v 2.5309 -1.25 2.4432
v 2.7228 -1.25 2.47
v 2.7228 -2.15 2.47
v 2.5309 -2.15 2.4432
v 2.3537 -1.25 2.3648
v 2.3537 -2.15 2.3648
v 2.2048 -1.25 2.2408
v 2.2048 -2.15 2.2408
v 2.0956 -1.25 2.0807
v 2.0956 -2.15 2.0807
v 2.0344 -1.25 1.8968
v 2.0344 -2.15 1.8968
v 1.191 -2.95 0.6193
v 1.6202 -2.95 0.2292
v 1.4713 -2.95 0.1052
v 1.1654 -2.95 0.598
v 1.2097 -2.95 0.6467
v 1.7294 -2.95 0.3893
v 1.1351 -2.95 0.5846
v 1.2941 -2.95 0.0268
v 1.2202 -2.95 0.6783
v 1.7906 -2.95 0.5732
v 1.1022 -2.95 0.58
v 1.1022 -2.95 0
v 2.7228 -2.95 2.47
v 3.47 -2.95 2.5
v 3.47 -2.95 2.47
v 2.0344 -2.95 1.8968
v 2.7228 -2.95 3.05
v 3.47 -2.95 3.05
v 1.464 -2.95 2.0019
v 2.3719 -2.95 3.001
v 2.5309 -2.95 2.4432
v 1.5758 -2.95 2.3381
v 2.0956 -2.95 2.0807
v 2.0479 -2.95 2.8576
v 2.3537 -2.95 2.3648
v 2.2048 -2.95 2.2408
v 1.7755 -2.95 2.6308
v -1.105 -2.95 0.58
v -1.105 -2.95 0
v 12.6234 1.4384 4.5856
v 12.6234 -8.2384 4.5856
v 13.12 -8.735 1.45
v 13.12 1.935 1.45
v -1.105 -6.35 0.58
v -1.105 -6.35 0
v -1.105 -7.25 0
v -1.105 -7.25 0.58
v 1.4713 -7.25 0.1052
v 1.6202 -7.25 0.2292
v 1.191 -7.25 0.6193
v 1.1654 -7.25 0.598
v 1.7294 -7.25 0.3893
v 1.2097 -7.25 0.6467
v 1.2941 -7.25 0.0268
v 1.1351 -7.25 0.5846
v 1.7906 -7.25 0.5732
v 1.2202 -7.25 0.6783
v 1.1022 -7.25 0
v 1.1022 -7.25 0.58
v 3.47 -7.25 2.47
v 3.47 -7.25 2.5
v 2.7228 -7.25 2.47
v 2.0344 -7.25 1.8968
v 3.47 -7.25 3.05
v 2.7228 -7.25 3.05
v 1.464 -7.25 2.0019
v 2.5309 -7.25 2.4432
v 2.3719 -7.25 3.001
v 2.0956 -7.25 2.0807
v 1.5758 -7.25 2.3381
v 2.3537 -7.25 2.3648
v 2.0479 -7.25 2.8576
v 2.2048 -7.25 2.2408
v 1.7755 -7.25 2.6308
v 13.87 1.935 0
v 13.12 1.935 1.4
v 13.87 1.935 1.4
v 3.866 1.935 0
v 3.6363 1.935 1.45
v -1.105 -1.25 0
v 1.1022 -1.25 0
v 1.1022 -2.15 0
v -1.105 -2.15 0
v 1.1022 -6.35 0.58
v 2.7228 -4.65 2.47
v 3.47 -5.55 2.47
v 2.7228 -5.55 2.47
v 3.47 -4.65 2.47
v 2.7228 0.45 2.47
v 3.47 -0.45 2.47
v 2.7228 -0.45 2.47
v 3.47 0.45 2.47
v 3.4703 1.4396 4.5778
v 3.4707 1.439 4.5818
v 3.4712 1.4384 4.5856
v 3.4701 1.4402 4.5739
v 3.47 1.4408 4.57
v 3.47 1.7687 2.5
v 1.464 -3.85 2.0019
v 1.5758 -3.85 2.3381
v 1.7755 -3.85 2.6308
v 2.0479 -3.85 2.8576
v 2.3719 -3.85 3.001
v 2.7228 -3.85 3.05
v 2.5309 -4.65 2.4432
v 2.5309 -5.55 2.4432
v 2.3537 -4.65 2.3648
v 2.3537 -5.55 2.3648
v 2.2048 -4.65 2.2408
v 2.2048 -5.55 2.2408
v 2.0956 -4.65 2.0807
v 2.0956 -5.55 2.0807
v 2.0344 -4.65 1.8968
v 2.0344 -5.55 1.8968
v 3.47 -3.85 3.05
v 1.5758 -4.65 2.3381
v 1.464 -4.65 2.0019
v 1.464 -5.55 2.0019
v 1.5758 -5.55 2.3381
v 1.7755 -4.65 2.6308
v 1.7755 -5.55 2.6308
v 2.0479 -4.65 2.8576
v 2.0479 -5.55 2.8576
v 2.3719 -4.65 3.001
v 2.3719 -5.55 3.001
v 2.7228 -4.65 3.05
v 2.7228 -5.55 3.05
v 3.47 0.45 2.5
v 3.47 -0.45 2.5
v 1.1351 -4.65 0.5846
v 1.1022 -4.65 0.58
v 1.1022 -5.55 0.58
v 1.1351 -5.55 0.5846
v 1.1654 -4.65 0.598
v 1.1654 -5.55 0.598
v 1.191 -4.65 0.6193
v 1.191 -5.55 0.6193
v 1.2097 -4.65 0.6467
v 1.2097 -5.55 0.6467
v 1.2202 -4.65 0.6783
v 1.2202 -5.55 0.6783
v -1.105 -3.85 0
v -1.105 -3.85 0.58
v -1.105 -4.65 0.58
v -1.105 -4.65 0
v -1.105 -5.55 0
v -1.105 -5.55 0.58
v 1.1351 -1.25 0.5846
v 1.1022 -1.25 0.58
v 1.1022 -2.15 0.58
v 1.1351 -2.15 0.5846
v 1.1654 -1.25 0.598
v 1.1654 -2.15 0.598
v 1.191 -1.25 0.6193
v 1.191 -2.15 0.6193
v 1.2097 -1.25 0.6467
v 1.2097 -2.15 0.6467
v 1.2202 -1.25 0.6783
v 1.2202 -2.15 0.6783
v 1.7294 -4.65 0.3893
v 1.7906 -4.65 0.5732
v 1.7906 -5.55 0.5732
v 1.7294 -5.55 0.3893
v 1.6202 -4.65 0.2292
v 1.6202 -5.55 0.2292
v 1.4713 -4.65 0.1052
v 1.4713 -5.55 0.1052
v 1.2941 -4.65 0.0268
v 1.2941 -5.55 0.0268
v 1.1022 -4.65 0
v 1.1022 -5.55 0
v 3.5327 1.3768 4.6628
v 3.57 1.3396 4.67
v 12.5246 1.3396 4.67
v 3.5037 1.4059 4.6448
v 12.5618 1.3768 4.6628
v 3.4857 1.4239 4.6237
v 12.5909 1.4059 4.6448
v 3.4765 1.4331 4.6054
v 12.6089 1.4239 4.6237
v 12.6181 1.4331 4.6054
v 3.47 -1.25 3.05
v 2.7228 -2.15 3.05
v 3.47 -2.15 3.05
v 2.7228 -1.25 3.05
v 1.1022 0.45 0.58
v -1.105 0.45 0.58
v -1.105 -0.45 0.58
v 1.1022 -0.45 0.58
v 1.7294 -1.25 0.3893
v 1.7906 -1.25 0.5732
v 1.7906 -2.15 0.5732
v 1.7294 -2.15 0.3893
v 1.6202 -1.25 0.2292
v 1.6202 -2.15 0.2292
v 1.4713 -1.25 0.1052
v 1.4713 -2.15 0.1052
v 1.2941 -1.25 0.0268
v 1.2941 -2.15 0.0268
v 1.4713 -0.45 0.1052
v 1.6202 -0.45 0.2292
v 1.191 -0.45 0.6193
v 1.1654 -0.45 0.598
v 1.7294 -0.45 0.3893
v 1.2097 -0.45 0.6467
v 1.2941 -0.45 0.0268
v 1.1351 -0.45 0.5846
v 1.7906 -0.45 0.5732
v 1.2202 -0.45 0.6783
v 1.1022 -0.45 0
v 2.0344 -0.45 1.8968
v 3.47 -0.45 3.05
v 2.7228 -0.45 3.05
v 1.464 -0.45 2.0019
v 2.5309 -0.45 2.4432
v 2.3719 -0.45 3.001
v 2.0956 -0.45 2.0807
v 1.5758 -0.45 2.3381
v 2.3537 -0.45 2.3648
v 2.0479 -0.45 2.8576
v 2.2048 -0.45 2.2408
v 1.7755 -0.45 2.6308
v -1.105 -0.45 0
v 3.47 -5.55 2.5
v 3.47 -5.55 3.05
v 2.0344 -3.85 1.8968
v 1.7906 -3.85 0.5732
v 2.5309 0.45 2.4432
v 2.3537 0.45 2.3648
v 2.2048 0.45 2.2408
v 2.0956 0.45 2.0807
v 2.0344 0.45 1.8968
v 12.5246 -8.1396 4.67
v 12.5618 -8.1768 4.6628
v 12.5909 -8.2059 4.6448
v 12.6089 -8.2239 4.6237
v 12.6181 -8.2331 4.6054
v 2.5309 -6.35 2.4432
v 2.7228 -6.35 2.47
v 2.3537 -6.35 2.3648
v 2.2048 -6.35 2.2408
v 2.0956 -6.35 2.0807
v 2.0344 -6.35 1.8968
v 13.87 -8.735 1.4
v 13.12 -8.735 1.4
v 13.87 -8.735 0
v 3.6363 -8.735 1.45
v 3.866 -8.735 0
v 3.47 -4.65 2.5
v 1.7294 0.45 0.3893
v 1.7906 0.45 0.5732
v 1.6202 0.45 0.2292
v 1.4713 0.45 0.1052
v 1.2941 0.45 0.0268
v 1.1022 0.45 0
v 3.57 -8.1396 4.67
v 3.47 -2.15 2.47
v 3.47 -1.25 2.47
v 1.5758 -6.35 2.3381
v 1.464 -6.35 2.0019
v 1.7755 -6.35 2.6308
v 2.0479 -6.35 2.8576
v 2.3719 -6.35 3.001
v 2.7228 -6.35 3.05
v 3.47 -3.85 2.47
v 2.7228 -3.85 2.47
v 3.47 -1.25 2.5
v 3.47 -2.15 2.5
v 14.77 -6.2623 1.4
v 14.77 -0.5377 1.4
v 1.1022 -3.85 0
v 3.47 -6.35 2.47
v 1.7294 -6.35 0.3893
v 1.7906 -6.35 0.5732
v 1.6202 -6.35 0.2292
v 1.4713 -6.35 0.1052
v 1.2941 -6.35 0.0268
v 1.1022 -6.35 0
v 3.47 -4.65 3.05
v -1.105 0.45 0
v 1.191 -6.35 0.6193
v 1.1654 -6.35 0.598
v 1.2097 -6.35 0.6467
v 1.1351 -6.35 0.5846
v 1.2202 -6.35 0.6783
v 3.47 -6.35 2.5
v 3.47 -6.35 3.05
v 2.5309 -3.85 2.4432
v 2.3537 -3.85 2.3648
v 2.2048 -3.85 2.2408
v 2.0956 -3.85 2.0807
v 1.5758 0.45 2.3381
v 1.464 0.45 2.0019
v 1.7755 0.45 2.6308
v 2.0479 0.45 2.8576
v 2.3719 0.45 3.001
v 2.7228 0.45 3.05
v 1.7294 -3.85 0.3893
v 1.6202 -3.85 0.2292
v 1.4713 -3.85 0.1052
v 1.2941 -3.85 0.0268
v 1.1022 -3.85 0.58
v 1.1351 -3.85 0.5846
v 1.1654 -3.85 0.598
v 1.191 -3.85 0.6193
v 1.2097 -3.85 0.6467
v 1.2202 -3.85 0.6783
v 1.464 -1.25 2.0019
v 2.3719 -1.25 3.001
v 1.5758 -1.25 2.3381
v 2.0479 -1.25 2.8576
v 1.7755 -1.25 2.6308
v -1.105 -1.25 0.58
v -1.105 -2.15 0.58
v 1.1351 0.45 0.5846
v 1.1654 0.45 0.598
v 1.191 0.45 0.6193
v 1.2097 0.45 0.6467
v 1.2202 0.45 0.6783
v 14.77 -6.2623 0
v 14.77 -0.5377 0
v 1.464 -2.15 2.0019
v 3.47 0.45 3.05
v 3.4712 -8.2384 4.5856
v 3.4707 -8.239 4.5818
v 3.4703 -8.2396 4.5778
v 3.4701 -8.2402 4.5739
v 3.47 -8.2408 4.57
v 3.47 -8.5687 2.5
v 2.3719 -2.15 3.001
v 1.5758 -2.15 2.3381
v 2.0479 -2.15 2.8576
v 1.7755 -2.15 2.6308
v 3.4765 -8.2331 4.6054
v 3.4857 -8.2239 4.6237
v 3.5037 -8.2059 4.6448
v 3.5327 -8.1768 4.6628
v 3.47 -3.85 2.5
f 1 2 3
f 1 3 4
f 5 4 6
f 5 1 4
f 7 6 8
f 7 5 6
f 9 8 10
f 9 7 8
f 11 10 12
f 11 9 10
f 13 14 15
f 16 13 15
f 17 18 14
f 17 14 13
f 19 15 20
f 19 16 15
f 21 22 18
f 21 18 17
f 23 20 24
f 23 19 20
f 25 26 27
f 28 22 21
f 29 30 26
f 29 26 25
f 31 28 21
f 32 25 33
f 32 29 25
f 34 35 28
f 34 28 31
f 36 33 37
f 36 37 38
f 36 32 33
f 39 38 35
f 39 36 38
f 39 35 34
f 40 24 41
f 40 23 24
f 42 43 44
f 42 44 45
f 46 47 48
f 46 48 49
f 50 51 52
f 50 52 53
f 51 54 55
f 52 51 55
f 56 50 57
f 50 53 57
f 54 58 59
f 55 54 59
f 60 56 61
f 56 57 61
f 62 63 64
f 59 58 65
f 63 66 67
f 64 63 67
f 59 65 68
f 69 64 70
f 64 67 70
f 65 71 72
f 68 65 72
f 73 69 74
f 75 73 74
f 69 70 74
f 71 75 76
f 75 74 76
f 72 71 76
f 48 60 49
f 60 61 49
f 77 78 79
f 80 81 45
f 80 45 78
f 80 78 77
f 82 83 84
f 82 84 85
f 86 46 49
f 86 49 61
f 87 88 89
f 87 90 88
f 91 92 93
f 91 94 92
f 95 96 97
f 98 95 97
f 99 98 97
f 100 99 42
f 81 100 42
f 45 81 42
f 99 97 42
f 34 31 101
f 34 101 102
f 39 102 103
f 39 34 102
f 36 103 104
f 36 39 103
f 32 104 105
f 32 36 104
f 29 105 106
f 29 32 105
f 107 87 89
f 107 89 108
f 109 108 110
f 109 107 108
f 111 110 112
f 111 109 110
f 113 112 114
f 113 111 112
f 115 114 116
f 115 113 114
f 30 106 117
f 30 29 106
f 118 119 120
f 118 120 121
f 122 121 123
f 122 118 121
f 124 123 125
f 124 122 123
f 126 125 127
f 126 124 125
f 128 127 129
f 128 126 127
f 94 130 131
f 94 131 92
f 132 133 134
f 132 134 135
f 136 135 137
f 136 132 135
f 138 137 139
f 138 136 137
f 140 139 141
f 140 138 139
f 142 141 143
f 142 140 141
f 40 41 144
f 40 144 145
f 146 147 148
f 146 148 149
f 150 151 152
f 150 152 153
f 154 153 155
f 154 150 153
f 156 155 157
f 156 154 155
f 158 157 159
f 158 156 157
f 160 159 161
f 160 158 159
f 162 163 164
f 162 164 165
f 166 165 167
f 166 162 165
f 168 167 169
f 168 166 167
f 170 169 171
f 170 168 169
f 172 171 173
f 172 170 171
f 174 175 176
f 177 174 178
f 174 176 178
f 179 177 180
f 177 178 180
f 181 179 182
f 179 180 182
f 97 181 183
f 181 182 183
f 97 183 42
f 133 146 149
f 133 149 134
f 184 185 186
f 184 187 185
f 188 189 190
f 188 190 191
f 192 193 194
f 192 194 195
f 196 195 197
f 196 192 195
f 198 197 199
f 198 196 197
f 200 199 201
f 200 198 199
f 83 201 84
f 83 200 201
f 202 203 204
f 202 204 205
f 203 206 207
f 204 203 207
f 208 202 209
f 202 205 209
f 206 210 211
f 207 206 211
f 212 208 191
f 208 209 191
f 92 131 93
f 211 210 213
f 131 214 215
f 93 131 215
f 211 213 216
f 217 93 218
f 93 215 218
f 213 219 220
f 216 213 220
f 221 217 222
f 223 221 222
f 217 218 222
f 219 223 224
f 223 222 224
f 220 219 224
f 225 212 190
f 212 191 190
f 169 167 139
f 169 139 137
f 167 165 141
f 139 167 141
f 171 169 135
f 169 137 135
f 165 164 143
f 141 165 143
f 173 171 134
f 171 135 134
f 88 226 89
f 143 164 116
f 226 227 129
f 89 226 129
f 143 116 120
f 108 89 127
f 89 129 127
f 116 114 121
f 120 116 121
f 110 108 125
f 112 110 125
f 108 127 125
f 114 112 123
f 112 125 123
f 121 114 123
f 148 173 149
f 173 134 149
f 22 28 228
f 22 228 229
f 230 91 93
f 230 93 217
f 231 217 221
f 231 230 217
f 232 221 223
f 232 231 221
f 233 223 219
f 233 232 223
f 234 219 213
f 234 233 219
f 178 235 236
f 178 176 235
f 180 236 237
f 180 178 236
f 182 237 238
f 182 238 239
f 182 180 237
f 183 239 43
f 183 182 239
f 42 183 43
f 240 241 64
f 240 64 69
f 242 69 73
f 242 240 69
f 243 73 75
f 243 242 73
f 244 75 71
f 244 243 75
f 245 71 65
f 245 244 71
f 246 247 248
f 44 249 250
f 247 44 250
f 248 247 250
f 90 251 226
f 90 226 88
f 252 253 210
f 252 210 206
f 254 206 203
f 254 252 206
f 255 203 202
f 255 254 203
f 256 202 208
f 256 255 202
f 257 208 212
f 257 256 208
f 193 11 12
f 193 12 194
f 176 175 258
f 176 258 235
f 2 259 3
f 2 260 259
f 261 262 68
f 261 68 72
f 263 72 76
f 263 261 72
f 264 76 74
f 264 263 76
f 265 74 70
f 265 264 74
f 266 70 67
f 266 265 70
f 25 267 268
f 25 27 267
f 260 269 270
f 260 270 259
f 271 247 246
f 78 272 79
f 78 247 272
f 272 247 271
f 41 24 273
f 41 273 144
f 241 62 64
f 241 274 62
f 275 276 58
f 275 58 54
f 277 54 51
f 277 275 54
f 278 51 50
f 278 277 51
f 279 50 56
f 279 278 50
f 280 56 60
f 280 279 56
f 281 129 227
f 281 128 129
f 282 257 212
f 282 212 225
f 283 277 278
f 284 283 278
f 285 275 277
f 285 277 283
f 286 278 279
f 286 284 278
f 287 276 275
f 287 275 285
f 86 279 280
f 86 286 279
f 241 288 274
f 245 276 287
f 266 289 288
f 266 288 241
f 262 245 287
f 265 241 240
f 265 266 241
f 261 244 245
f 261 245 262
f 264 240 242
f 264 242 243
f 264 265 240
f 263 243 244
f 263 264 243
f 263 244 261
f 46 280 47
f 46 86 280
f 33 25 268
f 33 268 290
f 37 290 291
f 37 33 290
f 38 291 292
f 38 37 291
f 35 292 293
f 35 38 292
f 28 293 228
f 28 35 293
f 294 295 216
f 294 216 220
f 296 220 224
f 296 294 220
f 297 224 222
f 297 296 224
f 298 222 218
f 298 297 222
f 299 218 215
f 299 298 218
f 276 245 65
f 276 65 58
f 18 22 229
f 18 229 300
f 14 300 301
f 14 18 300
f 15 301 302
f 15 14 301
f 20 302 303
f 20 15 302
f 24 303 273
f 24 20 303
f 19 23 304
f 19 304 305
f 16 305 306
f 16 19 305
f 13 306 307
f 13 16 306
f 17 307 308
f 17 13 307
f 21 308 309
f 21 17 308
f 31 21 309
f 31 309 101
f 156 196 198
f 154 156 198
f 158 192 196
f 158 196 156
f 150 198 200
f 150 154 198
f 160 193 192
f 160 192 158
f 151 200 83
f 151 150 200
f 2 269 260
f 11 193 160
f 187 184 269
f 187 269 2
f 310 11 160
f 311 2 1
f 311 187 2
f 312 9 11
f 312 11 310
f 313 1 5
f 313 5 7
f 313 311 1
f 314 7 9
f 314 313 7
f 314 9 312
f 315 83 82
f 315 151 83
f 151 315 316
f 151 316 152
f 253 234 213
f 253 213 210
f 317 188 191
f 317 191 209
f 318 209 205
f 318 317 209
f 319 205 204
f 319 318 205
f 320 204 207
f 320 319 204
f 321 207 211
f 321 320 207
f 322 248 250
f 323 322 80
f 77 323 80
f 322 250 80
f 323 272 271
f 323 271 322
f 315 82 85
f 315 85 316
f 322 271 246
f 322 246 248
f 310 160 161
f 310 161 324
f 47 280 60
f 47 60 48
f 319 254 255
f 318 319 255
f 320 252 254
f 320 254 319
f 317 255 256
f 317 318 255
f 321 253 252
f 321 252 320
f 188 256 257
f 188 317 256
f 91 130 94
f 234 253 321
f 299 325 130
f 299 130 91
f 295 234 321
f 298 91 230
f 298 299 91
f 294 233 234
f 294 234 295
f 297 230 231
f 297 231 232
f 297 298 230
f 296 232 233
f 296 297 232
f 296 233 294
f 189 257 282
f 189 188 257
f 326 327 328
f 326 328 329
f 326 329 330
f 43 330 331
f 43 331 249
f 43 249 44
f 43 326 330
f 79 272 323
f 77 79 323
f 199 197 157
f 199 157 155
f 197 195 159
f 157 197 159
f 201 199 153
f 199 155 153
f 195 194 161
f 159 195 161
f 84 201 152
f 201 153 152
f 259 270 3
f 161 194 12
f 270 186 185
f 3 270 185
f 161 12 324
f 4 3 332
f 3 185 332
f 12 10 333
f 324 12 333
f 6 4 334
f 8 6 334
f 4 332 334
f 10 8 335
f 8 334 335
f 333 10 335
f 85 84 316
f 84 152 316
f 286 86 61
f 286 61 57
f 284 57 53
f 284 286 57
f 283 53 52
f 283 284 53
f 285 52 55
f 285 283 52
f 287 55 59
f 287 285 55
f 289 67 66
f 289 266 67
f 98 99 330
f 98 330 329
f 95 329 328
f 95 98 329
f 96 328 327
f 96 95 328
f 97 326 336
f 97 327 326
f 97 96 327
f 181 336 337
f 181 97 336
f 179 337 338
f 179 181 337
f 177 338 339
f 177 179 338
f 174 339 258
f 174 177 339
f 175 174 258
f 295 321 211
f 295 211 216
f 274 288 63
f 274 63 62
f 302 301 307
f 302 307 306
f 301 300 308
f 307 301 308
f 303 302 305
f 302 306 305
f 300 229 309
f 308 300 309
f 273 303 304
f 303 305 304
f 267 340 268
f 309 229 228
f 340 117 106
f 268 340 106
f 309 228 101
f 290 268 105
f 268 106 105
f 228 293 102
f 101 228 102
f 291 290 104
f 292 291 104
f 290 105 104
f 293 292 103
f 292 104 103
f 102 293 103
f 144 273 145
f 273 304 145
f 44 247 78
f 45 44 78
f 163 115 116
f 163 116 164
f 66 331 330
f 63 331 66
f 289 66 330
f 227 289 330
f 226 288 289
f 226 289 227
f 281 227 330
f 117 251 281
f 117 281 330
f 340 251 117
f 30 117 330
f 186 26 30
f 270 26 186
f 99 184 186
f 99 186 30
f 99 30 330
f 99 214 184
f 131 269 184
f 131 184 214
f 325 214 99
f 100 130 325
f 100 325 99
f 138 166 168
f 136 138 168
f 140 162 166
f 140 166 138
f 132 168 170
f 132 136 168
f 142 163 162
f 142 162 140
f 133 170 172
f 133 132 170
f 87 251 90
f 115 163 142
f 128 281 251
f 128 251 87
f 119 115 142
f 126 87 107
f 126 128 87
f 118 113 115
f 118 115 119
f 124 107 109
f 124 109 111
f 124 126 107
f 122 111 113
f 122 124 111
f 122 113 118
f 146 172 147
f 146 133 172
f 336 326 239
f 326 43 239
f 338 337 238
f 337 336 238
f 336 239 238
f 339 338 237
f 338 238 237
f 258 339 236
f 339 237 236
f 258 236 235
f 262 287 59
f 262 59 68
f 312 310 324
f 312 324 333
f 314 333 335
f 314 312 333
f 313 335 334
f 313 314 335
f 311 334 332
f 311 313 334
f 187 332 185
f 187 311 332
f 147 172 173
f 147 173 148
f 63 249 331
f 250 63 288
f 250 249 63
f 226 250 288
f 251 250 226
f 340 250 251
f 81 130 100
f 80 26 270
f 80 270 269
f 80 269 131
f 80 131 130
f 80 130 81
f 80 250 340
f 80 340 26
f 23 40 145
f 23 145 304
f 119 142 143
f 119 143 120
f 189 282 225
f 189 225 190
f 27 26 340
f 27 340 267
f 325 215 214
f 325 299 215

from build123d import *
from OCP.BRepFilletAPI import BRepFilletAPI_MakeChamfer

# Parameters (mm, degrees)
SKETCH_1_W             = 9.65
SKETCH_1_H             = 10.67
EXTRUDE_1_DEPTH        = 4.67
SKETCH_2_W             = 1.4
SKETCH_2_H             = 10.67
EXTRUDE_2_DEPTH        = 1.65
CHAMFER_1_SIZE         = 0.9
CHAMFER_1_SIZE2        = 2.472729678
CHAMFER_2_SIZE         = 3.22
CHAMFER_2_SIZE2        = 0.509997898
CHAMFER_3_SIZE         = 2.5
CHAMFER_3_SIZE2        = 0.395961101
FILLET_1_R             = 0.1
EXTRUDE_2_2_DEPTH      = 0.45
PATTERN_LINEAR_1_COUNT = 5
PATTERN_LINEAR_1_PITCH = 1.7


with BuildPart() as part:
    # Эскиз1 → Бобышка-Вытянуть1 (new body)
    with BuildSketch(Plane.XY):
        Rectangle(SKETCH_1_W, SKETCH_1_H)
    extrude(amount=EXTRUDE_1_DEPTH)

    # Эскиз2 → Extrude 2 (add)
    with BuildSketch(Plane(origin=(4.825, 0, 0), x_dir=(0, 0, -1), z_dir=(1, 0, 0))):
        with Locations((-0.7, 0)):
            Rectangle(SKETCH_2_W, SKETCH_2_H)
    extrude(amount=EXTRUDE_2_DEPTH)

    # Фаска1: one chamfer whose edges measure the first distance from different faces: ONE call of the kernel's chamfer builder (chamfer() names one face for all edges)
    chamfer_1_edges_1 = [part.edges().sort_by_distance(p)[0] for p in [
        (6.475, 5.335, 0.7),
    ]]
    chamfer_1_side_1 = [part.faces().sort_by_distance(p)[0] for p in [
        (0.275490496, 5.335, 2.255278414),
    ]]
    chamfer_1_edges_2 = [part.edges().sort_by_distance(p)[0] for p in [
        (6.475, -5.335, 0.7),
    ]]
    chamfer_1_side_2 = [part.faces().sort_by_distance(p)[0] for p in [
        (0.275490496, -5.335, 2.255278414),
    ]]
    chamfer_1 = BRepFilletAPI_MakeChamfer(part.part.solid().wrapped)
    for e in chamfer_1_edges_1:
        chamfer_1.Add(CHAMFER_1_SIZE, CHAMFER_1_SIZE2, e.wrapped, chamfer_1_side_1[0].wrapped)  # the first distance lies on this face
    for e in chamfer_1_edges_2:
        chamfer_1.Add(CHAMFER_1_SIZE, CHAMFER_1_SIZE2, e.wrapped, chamfer_1_side_2[0].wrapped)  # the first distance lies on this face
    add(Compound.cast(chamfer_1.Shape()), mode=Mode.REPLACE)

    # Фаска2: one chamfer whose edges measure the first distance from different faces: ONE call of the kernel's chamfer builder (chamfer() names one face for all edges)
    chamfer_2_edges_1 = [part.edges().sort_by_distance(p)[0] for p in [
        (0, -5.335, 4.67),
    ]]
    chamfer_2_side_1 = [part.faces().sort_by_distance(p)[0] for p in [
        (0.118398369, -5.335, 2.29777282),
    ]]
    chamfer_2_edges_2 = [part.edges().sort_by_distance(p)[0] for p in [
        (0, 5.335, 4.67),
    ]]
    chamfer_2_side_2 = [part.faces().sort_by_distance(p)[0] for p in [
        (0.118398369, 5.335, 2.29777282),
    ]]
    chamfer_2_edges_3 = [part.edges().sort_by_distance(p)[0] for p in [
        (4.825, 0, 4.67),
    ]]
    chamfer_2_side_3 = [part.faces().sort_by_distance(p)[0] for p in [
        (4.825, 0, 3.035),
    ]]
    chamfer_2 = BRepFilletAPI_MakeChamfer(part.part.solid().wrapped)
    for e in chamfer_2_edges_1:
        chamfer_2.Add(CHAMFER_2_SIZE, CHAMFER_2_SIZE2, e.wrapped, chamfer_2_side_1[0].wrapped)  # the first distance lies on this face
    for e in chamfer_2_edges_2:
        chamfer_2.Add(CHAMFER_2_SIZE, CHAMFER_2_SIZE2, e.wrapped, chamfer_2_side_2[0].wrapped)  # the first distance lies on this face
    for e in chamfer_2_edges_3:
        chamfer_2.Add(CHAMFER_2_SIZE, CHAMFER_2_SIZE2, e.wrapped, chamfer_2_side_3[0].wrapped)  # the first distance lies on this face
    add(Compound.cast(chamfer_2.Shape()), mode=Mode.REPLACE)

    # Фаска3
    chamfer_3_edges = [part.edges().sort_by_distance(p)[0] for p in [
        (-4.825, 0, 0),
    ]]
    chamfer_3_side = [part.faces().sort_by_distance(p)[0] for p in [
        (-4.825, 0, 2.292002655),
    ]]
    chamfer(chamfer_3_edges, length=CHAMFER_3_SIZE, length2=CHAMFER_3_SIZE2, reference=chamfer_3_side[0])

    # Скругление1
    fillet_1_edges = [part.edges().sort_by_distance(p)[0] for p in [
        (-4.825, 0, 4.67),
        (4.315002102, 0, 4.67),
        (-0.254998949, 4.825002102, 4.67),
        (-0.254998949, -4.825002102, 4.67),
    ]]
    fillet(fillet_1_edges, radius=FILLET_1_R)

    # Эскиз6 → Extrude 2 2 (add, symmetric)
    with BuildSketch(Plane(origin=(0, 3.4, 0), x_dir=(-1, 0, 0), z_dir=(0, 1, 0))):
        with BuildLine():
            Line((4.825, 2.47), (5.572169718, 2.47))
            ThreePointArc((5.572169718, 2.47), (6.020070605, 2.307944974), (6.26058695, 1.896813701))
            Line((6.26058695, 1.896813701), (6.50441305, 0.573186299))
            ThreePointArc((6.50441305, 0.573186299), (6.744929395, 0.162055026), (7.192830282, 0))
            Line((7.192830282, 0), (9.4, 0))
            Line((9.4, 0), (9.4, 0.58))
            Line((9.4, 0.58), (7.192830282, 0.58))
            ThreePointArc((7.192830282, 0.58), (7.116047273, 0.607780862), (7.074815899, 0.678260508))
            Line((7.074815899, 0.678260508), (6.830989799, 2.00188791))
            ThreePointArc((6.830989799, 2.00188791), (6.391188483, 2.75367081), (5.572169718, 3.05))
            Line((5.572169718, 3.05), (4.825, 3.05))
            Line((4.825, 3.05), (4.825, 2.47))
        make_face()
    extrude_2_2 = extrude(amount=EXTRUDE_2_2_DEPTH, both=True)

    # Линейный массив1: Extrude 2 2 ×5
    with Locations(*[(0, -i * PATTERN_LINEAR_1_PITCH, 0) for i in range(1, PATTERN_LINEAR_1_COUNT)]):
        add(extrude_2_2)


with BuildPart() as part_1:
    # Move Body 1: read off the stored shape, not the designer's step
    # Move Body 1: moved
    add(part.part.moved(Location((8.295, -3.4, 0))))


solid = part_1.part
